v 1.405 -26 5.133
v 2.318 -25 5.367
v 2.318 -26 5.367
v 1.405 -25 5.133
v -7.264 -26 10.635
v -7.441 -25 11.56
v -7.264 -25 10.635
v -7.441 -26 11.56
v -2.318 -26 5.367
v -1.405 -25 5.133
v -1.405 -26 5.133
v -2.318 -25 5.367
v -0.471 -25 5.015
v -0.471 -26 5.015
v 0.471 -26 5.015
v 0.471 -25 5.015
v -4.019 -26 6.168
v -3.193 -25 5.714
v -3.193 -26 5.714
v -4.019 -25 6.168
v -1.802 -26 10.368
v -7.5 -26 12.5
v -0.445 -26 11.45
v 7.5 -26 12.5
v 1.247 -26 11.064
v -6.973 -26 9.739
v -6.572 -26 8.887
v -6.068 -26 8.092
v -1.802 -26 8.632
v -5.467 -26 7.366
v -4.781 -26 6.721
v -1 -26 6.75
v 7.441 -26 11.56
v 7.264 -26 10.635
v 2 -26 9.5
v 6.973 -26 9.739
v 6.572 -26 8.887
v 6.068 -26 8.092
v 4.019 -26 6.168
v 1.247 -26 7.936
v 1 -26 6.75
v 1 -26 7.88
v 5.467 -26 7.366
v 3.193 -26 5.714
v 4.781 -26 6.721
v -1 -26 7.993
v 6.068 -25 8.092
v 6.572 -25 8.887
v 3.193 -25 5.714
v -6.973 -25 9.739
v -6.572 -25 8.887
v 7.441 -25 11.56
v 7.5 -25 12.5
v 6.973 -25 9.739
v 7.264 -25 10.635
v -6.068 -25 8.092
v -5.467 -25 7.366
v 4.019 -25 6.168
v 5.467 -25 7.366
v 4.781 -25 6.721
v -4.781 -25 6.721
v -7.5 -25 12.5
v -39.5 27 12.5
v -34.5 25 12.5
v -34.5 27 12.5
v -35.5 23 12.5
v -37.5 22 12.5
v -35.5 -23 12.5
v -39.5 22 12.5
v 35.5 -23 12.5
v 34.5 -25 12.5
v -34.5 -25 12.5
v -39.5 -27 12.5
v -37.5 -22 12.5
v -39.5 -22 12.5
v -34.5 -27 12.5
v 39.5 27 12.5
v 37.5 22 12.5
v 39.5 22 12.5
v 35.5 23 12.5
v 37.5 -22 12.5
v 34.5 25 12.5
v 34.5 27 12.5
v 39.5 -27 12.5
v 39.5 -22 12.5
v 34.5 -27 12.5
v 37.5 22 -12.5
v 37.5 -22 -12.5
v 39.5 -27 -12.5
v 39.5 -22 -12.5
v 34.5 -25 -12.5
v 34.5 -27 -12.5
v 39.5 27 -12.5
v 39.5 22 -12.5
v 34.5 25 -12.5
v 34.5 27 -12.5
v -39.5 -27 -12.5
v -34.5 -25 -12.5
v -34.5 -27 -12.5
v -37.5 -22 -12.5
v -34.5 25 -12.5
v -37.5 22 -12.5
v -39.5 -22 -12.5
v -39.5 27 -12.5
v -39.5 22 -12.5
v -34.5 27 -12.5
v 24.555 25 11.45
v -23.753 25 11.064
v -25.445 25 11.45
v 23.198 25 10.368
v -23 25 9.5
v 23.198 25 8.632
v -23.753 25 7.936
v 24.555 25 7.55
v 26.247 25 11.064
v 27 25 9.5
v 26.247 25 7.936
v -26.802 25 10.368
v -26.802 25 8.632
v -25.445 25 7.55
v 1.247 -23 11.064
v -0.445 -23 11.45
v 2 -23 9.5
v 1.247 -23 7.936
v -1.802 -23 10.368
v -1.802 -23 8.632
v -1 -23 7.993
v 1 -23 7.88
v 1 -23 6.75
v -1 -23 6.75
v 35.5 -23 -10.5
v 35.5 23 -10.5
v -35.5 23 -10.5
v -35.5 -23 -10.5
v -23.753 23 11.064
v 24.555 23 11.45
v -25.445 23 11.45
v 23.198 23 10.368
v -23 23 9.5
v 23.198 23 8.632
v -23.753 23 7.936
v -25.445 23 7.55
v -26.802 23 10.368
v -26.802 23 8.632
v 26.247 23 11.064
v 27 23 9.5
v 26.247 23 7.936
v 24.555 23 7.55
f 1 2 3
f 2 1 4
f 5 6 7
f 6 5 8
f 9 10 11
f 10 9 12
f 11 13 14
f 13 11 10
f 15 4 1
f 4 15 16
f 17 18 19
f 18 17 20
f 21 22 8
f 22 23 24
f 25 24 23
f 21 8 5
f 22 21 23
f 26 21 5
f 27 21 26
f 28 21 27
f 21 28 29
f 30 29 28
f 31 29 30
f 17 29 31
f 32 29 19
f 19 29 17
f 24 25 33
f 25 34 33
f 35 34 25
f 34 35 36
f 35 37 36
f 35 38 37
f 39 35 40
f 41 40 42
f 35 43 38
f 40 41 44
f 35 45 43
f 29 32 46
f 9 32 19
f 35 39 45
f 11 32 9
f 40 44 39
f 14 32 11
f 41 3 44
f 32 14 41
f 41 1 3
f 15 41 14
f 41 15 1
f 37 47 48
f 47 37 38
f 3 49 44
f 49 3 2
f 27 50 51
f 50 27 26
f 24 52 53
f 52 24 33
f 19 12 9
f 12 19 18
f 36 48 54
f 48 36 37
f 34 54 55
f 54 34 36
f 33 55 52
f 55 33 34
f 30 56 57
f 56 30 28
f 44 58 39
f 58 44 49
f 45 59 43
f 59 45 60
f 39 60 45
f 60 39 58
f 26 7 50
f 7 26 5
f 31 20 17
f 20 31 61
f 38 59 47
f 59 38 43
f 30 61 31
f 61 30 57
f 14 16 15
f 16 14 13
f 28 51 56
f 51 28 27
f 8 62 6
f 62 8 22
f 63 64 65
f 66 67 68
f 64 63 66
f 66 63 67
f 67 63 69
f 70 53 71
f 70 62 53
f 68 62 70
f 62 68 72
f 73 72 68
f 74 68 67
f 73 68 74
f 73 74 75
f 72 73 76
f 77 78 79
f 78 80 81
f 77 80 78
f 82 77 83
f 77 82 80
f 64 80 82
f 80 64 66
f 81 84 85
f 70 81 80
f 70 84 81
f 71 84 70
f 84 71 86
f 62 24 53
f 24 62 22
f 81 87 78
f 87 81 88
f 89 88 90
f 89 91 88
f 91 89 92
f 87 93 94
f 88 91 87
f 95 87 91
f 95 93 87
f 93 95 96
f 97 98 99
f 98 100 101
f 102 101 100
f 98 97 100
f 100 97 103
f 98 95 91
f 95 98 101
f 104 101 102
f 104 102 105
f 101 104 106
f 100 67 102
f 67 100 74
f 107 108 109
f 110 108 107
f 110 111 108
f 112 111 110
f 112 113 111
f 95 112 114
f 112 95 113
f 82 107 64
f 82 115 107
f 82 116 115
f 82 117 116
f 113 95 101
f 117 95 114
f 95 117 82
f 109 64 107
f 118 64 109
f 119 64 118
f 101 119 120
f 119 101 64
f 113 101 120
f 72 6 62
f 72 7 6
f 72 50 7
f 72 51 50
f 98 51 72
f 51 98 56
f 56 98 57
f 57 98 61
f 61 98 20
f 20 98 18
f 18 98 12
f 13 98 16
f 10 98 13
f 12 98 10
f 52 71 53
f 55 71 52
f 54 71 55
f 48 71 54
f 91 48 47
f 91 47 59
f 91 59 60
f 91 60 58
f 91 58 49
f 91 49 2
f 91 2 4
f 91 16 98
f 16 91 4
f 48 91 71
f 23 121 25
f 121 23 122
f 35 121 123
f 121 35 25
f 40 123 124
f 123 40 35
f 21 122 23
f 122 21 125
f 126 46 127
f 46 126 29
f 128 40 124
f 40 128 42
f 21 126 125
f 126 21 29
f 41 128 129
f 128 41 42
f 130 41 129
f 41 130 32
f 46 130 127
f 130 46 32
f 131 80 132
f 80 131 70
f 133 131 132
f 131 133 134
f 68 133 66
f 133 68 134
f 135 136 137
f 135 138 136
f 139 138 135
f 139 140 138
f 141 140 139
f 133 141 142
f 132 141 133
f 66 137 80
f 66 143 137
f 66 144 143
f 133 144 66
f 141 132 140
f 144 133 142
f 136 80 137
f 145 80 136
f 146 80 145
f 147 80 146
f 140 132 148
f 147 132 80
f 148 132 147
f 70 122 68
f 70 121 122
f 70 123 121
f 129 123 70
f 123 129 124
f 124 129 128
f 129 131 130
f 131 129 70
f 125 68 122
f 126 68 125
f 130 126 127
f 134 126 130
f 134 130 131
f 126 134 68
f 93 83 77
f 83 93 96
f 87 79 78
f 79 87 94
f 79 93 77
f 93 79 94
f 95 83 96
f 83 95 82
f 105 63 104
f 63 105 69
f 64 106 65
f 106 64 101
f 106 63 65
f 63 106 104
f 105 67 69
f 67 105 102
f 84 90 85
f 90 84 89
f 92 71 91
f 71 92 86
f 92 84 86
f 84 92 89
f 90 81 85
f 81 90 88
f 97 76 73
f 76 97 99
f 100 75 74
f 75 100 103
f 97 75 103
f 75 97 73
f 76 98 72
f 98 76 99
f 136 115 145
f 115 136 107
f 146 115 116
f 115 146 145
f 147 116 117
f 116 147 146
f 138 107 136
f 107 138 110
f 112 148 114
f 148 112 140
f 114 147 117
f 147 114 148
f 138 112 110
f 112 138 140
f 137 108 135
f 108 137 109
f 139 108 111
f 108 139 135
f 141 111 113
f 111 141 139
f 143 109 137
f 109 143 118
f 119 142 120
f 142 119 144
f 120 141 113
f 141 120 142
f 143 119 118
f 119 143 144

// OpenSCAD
box_w = 75;
box_d = 50;
box_h = 25;

box_wall_thickness = 2;

module lid() {
	difference() {
		union() {
			rotate(a=[0,90,0]) cylinder(r=box_d/2, h=box_w, center=true, $fn=100);

			// end straps
			translate([-box_w/2+.5, 0, 0]) rotate(a=[0,90,0]) difference() {
				cylinder(r=box_d/2+2, h=5, center=true, $fn=100);
				cylinder(r=(box_d/2+2)-5, h=6, center=true, $fn=100);
			}
			translate([box_w/2-.5, 0, 0]) rotate(a=[0,90,0]) difference() {
				cylinder(r=box_d/2+2, h=5, center=true, $fn=100);
				cylinder(r=(box_d/2+2)-5, h=6, center=true, $fn=100);
			}

			// lock outline
			translate([0, -box_d/2, 0]) rotate(a=[90, 0, 0]) difference() {
				cylinder(r=7.5, h=box_wall_thickness, $fn=50, center=true);
				translate([0, -5, 0]) cube([15, 10, 15], center=true);
			}
		}

		// coin slot
		translate([0,0,-box_d/2]) cube([box_w*2, box_d*2, box_d], center=true);

		// carve out the circular hollow in the bottom of the lid
		rotate(a=[0, 90, 0]) {
			//cube([box_w-4, (box_d-4)/(sqrt(2)), (box_d-4)/(sqrt(2))], center=true);
			cylinder(r=box_d/2-box_wall_thickness, h=box_w - box_wall_thickness*2, center=true);
		}

		// square the bottom half 
		cube([25, 4, 100], center=true);

		// back hinge holes
		translate([box_w/3, box_d/2, 3]) rotate(a=[90, 0, 0]) cylinder(r=2, h=20, center=true);
		translate([-box_w/3, box_d/2, 3]) rotate(a=[90, 0, 0]) cylinder(r=2, h=20, center=true);

		// front lock hole
		translate([0, -box_d/2, 3]) rotate(a=[90, 0, 0]) cylinder(r=2, h=20, center=true);
	}
}


module corner_bracket() {
	union() {
		translate([-.5, -1, 0]) cube([5, 2, box_h], center=true);
		translate([1, .5, 0]) rotate(a=[0,0,90]) cube([5, 2, box_h], center=true);	
	}
}

module box() {
	difference() {
		union() {
			difference() {
				union() {
					cube([box_w, box_d, box_h], center=true);

					// lock outline
					translate([0, -box_d/2, box_h/2]) rotate(a=[90, 0, 0]) difference() {
						cylinder(r=7.5, h=box_wall_thickness, $fn=50, center=true);
						translate([0, 5, 0]) cube([15, 10, 15], center=true);
					}
				}

				// carve out the inside of the box
				translate([0,0,box_wall_thickness]) {
					cube([box_w - box_wall_thickness*2, box_d - box_wall_thickness*2, box_h], center=true);
				}

				// cut the keyhole
				translate([0, -box_d/2, box_h/2 - 3]) union() {
					rotate(a=[90, 0, 0]) cylinder(r=2, h=20, center=true);
					translate([0,0,-1.75]) cube([2, 20, 2], center=true);
				}
			}
			
			translate([box_w/2, box_d/2]) rotate(a=[0, 0, 90]) corner_bracket();
			translate([-box_w/2, box_d/2]) rotate(a=[0, 0, 180]) corner_bracket();
			translate([box_w/2, -box_d/2]) rotate(a=[0, 0, 0]) corner_bracket();
			translate([-box_w/2, -box_d/2]) rotate(a=[0, 0, 270]) corner_bracket();
		}

		translate([box_w/3, box_d/2, box_h/2 - 3]) rotate(a=[90, 0, 0]) cylinder(r=2, h=10, center=true);
		translate([-box_w/3, box_d/2, box_h/2 - 3]) rotate(a=[90, 0, 0]) cylinder(r=2, h=10, center=true);
	}
}

!box();
translate([0,0,box_h/2]) lid();
